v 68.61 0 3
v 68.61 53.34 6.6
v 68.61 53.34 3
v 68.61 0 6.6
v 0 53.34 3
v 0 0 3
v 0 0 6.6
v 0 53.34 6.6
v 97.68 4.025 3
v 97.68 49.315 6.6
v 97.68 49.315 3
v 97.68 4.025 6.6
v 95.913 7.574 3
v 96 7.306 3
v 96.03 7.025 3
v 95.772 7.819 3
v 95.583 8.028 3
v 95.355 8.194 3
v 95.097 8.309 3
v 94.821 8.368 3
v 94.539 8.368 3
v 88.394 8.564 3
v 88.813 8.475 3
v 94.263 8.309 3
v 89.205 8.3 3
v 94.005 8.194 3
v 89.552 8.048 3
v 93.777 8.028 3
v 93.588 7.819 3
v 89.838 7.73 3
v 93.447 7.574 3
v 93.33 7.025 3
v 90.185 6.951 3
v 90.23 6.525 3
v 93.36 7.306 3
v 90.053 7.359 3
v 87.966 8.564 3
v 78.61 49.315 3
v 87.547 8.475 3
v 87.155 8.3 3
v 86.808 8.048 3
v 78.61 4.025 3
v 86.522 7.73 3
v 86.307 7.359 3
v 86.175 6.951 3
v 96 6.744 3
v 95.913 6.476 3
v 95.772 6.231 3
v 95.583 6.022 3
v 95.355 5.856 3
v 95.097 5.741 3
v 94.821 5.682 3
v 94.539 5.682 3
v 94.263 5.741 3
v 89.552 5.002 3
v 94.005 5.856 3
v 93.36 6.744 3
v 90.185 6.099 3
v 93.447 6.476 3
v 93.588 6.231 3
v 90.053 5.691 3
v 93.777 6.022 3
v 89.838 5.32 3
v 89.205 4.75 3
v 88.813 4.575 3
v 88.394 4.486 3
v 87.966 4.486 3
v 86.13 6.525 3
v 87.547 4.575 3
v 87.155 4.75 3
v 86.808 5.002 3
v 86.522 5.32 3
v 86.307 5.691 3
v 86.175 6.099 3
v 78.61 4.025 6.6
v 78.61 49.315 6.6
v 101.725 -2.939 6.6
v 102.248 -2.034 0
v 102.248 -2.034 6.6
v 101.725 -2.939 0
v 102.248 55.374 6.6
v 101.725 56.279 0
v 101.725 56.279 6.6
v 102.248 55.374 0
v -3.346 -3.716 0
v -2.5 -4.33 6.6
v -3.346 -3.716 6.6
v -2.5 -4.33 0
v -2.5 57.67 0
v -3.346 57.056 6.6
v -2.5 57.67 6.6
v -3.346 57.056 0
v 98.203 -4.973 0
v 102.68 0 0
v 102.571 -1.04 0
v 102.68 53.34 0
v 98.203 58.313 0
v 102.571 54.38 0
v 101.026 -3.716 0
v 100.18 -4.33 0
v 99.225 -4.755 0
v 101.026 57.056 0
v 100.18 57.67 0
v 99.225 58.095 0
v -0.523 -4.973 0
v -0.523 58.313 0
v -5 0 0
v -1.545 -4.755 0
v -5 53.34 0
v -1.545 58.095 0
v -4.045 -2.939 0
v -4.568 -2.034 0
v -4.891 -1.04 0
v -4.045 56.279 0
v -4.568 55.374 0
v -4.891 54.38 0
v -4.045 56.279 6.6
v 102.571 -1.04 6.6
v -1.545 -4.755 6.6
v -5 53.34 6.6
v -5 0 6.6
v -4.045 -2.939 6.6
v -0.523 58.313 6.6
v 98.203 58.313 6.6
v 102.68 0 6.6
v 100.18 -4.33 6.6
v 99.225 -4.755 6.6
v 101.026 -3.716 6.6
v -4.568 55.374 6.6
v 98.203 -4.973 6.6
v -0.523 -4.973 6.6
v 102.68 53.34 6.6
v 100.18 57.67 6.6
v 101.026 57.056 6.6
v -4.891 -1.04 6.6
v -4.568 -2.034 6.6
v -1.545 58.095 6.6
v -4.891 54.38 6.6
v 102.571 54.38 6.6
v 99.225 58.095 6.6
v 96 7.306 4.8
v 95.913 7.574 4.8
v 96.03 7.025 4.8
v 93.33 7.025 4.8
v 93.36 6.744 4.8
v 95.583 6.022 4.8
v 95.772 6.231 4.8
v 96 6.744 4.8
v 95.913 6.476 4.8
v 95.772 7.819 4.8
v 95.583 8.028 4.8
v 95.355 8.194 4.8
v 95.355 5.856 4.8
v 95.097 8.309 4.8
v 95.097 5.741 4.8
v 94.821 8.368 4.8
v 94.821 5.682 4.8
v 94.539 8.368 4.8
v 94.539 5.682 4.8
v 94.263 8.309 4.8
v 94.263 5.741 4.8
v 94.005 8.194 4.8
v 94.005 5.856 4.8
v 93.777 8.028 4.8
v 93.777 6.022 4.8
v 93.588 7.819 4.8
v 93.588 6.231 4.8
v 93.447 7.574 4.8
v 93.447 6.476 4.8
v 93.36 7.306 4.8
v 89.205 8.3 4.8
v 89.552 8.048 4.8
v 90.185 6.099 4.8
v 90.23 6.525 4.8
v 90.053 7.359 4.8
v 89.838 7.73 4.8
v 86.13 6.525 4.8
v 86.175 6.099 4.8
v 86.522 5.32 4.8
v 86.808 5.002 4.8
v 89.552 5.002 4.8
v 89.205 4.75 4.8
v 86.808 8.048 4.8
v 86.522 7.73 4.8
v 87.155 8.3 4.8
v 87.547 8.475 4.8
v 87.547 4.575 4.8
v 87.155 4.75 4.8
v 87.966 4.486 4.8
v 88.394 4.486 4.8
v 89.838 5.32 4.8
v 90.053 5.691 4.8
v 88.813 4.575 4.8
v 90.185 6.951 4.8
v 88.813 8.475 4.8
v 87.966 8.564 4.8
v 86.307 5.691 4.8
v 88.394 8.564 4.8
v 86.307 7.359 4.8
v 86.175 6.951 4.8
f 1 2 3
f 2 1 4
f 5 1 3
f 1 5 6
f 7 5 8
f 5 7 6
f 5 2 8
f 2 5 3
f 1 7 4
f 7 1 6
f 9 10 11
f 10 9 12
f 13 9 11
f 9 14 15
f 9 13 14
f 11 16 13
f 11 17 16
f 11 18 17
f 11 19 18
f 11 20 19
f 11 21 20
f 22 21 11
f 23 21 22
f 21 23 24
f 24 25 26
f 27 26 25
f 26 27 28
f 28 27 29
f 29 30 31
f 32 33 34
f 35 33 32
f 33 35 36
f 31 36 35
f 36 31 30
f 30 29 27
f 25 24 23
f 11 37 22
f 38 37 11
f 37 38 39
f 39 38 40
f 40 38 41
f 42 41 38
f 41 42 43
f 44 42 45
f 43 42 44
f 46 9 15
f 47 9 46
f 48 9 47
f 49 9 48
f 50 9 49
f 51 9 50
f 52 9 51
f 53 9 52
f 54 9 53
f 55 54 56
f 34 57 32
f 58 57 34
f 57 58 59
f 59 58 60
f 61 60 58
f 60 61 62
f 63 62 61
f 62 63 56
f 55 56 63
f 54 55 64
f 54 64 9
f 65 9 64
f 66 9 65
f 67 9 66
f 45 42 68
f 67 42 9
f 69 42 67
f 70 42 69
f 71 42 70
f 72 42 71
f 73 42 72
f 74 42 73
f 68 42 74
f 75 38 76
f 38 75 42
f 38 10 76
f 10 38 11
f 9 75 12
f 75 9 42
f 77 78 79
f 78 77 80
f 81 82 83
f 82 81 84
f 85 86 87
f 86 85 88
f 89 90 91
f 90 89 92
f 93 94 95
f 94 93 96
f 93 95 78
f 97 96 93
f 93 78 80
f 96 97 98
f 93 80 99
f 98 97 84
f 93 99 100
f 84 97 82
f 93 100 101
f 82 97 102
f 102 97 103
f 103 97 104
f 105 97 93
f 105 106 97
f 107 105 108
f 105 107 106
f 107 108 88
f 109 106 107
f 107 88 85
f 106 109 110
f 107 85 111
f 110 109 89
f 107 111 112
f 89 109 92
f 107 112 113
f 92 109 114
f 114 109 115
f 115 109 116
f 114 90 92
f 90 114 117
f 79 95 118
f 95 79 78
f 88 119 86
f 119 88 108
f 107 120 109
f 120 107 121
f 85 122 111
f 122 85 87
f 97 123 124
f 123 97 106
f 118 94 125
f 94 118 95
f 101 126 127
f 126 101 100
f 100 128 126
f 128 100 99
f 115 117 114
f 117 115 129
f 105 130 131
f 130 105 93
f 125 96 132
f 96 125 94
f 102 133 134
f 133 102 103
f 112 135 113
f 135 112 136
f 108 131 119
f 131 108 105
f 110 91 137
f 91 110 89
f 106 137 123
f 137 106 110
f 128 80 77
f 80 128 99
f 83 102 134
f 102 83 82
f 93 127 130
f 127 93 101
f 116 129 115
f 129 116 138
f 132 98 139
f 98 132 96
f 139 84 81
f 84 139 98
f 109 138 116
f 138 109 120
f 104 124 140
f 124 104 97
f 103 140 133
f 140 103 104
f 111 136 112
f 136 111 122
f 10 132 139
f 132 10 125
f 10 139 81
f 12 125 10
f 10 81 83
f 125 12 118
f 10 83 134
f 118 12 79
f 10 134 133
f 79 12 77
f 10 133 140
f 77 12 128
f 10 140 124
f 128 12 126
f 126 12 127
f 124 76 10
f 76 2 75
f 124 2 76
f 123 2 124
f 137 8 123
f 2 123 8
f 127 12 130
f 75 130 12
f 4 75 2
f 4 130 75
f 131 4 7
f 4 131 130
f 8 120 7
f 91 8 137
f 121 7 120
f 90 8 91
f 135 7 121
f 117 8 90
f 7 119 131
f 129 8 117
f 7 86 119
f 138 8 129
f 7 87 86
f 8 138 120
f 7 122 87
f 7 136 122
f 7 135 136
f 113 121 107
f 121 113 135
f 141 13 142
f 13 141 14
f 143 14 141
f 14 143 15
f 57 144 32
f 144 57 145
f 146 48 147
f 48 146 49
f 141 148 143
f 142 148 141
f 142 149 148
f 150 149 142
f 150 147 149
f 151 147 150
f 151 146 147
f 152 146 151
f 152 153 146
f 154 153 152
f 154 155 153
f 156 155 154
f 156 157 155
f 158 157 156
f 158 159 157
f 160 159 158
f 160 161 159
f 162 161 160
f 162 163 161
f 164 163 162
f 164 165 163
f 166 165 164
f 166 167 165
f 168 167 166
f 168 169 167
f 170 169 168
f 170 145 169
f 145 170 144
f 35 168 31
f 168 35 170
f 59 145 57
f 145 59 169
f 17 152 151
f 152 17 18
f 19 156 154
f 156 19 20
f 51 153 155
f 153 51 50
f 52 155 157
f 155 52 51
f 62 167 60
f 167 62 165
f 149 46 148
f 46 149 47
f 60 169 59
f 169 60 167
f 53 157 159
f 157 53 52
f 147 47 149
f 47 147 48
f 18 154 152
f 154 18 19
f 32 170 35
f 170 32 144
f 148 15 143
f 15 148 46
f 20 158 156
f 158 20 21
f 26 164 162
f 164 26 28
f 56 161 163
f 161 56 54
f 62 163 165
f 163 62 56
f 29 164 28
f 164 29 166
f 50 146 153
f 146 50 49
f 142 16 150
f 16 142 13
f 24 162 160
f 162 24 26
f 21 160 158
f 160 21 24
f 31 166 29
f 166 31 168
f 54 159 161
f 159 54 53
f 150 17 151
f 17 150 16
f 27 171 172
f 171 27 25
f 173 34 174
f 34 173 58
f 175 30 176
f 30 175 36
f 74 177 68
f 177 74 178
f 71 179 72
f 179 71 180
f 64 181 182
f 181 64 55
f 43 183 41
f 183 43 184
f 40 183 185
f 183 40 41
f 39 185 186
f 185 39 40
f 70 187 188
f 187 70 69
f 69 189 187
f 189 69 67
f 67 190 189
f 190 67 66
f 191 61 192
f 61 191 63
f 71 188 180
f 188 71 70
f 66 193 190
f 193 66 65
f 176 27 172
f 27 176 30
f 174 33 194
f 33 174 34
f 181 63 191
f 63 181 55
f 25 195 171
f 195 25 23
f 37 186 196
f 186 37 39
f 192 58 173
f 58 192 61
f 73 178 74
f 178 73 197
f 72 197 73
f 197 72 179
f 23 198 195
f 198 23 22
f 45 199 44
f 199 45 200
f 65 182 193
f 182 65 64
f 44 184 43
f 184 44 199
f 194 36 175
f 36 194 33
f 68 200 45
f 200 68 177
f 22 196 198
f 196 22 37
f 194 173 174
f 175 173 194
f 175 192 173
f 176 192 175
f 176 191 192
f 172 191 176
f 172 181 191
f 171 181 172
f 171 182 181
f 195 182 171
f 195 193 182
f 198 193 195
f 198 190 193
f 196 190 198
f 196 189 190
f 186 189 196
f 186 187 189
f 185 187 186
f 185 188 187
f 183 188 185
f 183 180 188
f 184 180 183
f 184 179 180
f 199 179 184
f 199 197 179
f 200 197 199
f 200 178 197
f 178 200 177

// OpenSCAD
// units: mm
// x/y coordinates with USB port on left.

$fs = 0.01;

TOL = 0.001;

FULL = 10;

rf_switch = [19.07, 45.29, 2.6];
arduino = [68.61, 53.34, 3.6];

switch_arduino_sep = 10;

// underneath arduino
case_thickness = 3;

// border around arduino
case_border = 5;

// switch info
switch_big_hole_diam = 4.1;
switch_small_hole_diam = 2.7;
switch_hole_height = 1.8;

// confirm location from datasheet
switch_small_hole_location = [-3, 3];
switch_big_hole_location = [-9.5, 2.5];

// arduino  holes

module components() {
    translate([0, 0, case_thickness]) {
        cube([arduino.x, arduino.y, FULL]);

        translate([arduino.x + switch_arduino_sep,
                    (arduino.y - rf_switch.y)/2, 0]) {
            cube([rf_switch.x, rf_switch.y, FULL]);
        }
    }
}

module case_outline() {
    linear_extrude(case_thickness + arduino.z) {
        minkowski() {
            square([arduino.x + switch_arduino_sep + rf_switch.x,
                    arduino.y]);
            circle(case_border);
        }

    }
    
    // minkowski() {
    //     square([arduino.x + switch_arduino_sep + rf_switch.x,
    //             arduino.y);
    //     circle(5);
    // }
    
    // cube([case_border * 2 + arduino.x + switch_arduino_sep + rf_switch.x,
    //     case_border + arduino.y + case_border,
    //     case_thickness + arduino.z]);
}

module holes() {
    // arduino holes

    // rf switch holes
    translate([arduino.x + switch_arduino_sep + rf_switch.x,
                    (arduino.y - rf_switch.y)/2, 0])
    {
        translate(switch_small_hole_location) {
            linear_extrude(case_thickness + switch_hole_height) {
                circle(d=switch_small_hole_diam);
            }
        }

        translate(switch_big_hole_location) {
            linear_extrude(case_thickness + switch_hole_height) {
                circle(d=switch_big_hole_diam);
            }
        }
    }
}

union() {
    difference() {
        case_outline();
        components();
    }
    holes();
}


// case_outline();
